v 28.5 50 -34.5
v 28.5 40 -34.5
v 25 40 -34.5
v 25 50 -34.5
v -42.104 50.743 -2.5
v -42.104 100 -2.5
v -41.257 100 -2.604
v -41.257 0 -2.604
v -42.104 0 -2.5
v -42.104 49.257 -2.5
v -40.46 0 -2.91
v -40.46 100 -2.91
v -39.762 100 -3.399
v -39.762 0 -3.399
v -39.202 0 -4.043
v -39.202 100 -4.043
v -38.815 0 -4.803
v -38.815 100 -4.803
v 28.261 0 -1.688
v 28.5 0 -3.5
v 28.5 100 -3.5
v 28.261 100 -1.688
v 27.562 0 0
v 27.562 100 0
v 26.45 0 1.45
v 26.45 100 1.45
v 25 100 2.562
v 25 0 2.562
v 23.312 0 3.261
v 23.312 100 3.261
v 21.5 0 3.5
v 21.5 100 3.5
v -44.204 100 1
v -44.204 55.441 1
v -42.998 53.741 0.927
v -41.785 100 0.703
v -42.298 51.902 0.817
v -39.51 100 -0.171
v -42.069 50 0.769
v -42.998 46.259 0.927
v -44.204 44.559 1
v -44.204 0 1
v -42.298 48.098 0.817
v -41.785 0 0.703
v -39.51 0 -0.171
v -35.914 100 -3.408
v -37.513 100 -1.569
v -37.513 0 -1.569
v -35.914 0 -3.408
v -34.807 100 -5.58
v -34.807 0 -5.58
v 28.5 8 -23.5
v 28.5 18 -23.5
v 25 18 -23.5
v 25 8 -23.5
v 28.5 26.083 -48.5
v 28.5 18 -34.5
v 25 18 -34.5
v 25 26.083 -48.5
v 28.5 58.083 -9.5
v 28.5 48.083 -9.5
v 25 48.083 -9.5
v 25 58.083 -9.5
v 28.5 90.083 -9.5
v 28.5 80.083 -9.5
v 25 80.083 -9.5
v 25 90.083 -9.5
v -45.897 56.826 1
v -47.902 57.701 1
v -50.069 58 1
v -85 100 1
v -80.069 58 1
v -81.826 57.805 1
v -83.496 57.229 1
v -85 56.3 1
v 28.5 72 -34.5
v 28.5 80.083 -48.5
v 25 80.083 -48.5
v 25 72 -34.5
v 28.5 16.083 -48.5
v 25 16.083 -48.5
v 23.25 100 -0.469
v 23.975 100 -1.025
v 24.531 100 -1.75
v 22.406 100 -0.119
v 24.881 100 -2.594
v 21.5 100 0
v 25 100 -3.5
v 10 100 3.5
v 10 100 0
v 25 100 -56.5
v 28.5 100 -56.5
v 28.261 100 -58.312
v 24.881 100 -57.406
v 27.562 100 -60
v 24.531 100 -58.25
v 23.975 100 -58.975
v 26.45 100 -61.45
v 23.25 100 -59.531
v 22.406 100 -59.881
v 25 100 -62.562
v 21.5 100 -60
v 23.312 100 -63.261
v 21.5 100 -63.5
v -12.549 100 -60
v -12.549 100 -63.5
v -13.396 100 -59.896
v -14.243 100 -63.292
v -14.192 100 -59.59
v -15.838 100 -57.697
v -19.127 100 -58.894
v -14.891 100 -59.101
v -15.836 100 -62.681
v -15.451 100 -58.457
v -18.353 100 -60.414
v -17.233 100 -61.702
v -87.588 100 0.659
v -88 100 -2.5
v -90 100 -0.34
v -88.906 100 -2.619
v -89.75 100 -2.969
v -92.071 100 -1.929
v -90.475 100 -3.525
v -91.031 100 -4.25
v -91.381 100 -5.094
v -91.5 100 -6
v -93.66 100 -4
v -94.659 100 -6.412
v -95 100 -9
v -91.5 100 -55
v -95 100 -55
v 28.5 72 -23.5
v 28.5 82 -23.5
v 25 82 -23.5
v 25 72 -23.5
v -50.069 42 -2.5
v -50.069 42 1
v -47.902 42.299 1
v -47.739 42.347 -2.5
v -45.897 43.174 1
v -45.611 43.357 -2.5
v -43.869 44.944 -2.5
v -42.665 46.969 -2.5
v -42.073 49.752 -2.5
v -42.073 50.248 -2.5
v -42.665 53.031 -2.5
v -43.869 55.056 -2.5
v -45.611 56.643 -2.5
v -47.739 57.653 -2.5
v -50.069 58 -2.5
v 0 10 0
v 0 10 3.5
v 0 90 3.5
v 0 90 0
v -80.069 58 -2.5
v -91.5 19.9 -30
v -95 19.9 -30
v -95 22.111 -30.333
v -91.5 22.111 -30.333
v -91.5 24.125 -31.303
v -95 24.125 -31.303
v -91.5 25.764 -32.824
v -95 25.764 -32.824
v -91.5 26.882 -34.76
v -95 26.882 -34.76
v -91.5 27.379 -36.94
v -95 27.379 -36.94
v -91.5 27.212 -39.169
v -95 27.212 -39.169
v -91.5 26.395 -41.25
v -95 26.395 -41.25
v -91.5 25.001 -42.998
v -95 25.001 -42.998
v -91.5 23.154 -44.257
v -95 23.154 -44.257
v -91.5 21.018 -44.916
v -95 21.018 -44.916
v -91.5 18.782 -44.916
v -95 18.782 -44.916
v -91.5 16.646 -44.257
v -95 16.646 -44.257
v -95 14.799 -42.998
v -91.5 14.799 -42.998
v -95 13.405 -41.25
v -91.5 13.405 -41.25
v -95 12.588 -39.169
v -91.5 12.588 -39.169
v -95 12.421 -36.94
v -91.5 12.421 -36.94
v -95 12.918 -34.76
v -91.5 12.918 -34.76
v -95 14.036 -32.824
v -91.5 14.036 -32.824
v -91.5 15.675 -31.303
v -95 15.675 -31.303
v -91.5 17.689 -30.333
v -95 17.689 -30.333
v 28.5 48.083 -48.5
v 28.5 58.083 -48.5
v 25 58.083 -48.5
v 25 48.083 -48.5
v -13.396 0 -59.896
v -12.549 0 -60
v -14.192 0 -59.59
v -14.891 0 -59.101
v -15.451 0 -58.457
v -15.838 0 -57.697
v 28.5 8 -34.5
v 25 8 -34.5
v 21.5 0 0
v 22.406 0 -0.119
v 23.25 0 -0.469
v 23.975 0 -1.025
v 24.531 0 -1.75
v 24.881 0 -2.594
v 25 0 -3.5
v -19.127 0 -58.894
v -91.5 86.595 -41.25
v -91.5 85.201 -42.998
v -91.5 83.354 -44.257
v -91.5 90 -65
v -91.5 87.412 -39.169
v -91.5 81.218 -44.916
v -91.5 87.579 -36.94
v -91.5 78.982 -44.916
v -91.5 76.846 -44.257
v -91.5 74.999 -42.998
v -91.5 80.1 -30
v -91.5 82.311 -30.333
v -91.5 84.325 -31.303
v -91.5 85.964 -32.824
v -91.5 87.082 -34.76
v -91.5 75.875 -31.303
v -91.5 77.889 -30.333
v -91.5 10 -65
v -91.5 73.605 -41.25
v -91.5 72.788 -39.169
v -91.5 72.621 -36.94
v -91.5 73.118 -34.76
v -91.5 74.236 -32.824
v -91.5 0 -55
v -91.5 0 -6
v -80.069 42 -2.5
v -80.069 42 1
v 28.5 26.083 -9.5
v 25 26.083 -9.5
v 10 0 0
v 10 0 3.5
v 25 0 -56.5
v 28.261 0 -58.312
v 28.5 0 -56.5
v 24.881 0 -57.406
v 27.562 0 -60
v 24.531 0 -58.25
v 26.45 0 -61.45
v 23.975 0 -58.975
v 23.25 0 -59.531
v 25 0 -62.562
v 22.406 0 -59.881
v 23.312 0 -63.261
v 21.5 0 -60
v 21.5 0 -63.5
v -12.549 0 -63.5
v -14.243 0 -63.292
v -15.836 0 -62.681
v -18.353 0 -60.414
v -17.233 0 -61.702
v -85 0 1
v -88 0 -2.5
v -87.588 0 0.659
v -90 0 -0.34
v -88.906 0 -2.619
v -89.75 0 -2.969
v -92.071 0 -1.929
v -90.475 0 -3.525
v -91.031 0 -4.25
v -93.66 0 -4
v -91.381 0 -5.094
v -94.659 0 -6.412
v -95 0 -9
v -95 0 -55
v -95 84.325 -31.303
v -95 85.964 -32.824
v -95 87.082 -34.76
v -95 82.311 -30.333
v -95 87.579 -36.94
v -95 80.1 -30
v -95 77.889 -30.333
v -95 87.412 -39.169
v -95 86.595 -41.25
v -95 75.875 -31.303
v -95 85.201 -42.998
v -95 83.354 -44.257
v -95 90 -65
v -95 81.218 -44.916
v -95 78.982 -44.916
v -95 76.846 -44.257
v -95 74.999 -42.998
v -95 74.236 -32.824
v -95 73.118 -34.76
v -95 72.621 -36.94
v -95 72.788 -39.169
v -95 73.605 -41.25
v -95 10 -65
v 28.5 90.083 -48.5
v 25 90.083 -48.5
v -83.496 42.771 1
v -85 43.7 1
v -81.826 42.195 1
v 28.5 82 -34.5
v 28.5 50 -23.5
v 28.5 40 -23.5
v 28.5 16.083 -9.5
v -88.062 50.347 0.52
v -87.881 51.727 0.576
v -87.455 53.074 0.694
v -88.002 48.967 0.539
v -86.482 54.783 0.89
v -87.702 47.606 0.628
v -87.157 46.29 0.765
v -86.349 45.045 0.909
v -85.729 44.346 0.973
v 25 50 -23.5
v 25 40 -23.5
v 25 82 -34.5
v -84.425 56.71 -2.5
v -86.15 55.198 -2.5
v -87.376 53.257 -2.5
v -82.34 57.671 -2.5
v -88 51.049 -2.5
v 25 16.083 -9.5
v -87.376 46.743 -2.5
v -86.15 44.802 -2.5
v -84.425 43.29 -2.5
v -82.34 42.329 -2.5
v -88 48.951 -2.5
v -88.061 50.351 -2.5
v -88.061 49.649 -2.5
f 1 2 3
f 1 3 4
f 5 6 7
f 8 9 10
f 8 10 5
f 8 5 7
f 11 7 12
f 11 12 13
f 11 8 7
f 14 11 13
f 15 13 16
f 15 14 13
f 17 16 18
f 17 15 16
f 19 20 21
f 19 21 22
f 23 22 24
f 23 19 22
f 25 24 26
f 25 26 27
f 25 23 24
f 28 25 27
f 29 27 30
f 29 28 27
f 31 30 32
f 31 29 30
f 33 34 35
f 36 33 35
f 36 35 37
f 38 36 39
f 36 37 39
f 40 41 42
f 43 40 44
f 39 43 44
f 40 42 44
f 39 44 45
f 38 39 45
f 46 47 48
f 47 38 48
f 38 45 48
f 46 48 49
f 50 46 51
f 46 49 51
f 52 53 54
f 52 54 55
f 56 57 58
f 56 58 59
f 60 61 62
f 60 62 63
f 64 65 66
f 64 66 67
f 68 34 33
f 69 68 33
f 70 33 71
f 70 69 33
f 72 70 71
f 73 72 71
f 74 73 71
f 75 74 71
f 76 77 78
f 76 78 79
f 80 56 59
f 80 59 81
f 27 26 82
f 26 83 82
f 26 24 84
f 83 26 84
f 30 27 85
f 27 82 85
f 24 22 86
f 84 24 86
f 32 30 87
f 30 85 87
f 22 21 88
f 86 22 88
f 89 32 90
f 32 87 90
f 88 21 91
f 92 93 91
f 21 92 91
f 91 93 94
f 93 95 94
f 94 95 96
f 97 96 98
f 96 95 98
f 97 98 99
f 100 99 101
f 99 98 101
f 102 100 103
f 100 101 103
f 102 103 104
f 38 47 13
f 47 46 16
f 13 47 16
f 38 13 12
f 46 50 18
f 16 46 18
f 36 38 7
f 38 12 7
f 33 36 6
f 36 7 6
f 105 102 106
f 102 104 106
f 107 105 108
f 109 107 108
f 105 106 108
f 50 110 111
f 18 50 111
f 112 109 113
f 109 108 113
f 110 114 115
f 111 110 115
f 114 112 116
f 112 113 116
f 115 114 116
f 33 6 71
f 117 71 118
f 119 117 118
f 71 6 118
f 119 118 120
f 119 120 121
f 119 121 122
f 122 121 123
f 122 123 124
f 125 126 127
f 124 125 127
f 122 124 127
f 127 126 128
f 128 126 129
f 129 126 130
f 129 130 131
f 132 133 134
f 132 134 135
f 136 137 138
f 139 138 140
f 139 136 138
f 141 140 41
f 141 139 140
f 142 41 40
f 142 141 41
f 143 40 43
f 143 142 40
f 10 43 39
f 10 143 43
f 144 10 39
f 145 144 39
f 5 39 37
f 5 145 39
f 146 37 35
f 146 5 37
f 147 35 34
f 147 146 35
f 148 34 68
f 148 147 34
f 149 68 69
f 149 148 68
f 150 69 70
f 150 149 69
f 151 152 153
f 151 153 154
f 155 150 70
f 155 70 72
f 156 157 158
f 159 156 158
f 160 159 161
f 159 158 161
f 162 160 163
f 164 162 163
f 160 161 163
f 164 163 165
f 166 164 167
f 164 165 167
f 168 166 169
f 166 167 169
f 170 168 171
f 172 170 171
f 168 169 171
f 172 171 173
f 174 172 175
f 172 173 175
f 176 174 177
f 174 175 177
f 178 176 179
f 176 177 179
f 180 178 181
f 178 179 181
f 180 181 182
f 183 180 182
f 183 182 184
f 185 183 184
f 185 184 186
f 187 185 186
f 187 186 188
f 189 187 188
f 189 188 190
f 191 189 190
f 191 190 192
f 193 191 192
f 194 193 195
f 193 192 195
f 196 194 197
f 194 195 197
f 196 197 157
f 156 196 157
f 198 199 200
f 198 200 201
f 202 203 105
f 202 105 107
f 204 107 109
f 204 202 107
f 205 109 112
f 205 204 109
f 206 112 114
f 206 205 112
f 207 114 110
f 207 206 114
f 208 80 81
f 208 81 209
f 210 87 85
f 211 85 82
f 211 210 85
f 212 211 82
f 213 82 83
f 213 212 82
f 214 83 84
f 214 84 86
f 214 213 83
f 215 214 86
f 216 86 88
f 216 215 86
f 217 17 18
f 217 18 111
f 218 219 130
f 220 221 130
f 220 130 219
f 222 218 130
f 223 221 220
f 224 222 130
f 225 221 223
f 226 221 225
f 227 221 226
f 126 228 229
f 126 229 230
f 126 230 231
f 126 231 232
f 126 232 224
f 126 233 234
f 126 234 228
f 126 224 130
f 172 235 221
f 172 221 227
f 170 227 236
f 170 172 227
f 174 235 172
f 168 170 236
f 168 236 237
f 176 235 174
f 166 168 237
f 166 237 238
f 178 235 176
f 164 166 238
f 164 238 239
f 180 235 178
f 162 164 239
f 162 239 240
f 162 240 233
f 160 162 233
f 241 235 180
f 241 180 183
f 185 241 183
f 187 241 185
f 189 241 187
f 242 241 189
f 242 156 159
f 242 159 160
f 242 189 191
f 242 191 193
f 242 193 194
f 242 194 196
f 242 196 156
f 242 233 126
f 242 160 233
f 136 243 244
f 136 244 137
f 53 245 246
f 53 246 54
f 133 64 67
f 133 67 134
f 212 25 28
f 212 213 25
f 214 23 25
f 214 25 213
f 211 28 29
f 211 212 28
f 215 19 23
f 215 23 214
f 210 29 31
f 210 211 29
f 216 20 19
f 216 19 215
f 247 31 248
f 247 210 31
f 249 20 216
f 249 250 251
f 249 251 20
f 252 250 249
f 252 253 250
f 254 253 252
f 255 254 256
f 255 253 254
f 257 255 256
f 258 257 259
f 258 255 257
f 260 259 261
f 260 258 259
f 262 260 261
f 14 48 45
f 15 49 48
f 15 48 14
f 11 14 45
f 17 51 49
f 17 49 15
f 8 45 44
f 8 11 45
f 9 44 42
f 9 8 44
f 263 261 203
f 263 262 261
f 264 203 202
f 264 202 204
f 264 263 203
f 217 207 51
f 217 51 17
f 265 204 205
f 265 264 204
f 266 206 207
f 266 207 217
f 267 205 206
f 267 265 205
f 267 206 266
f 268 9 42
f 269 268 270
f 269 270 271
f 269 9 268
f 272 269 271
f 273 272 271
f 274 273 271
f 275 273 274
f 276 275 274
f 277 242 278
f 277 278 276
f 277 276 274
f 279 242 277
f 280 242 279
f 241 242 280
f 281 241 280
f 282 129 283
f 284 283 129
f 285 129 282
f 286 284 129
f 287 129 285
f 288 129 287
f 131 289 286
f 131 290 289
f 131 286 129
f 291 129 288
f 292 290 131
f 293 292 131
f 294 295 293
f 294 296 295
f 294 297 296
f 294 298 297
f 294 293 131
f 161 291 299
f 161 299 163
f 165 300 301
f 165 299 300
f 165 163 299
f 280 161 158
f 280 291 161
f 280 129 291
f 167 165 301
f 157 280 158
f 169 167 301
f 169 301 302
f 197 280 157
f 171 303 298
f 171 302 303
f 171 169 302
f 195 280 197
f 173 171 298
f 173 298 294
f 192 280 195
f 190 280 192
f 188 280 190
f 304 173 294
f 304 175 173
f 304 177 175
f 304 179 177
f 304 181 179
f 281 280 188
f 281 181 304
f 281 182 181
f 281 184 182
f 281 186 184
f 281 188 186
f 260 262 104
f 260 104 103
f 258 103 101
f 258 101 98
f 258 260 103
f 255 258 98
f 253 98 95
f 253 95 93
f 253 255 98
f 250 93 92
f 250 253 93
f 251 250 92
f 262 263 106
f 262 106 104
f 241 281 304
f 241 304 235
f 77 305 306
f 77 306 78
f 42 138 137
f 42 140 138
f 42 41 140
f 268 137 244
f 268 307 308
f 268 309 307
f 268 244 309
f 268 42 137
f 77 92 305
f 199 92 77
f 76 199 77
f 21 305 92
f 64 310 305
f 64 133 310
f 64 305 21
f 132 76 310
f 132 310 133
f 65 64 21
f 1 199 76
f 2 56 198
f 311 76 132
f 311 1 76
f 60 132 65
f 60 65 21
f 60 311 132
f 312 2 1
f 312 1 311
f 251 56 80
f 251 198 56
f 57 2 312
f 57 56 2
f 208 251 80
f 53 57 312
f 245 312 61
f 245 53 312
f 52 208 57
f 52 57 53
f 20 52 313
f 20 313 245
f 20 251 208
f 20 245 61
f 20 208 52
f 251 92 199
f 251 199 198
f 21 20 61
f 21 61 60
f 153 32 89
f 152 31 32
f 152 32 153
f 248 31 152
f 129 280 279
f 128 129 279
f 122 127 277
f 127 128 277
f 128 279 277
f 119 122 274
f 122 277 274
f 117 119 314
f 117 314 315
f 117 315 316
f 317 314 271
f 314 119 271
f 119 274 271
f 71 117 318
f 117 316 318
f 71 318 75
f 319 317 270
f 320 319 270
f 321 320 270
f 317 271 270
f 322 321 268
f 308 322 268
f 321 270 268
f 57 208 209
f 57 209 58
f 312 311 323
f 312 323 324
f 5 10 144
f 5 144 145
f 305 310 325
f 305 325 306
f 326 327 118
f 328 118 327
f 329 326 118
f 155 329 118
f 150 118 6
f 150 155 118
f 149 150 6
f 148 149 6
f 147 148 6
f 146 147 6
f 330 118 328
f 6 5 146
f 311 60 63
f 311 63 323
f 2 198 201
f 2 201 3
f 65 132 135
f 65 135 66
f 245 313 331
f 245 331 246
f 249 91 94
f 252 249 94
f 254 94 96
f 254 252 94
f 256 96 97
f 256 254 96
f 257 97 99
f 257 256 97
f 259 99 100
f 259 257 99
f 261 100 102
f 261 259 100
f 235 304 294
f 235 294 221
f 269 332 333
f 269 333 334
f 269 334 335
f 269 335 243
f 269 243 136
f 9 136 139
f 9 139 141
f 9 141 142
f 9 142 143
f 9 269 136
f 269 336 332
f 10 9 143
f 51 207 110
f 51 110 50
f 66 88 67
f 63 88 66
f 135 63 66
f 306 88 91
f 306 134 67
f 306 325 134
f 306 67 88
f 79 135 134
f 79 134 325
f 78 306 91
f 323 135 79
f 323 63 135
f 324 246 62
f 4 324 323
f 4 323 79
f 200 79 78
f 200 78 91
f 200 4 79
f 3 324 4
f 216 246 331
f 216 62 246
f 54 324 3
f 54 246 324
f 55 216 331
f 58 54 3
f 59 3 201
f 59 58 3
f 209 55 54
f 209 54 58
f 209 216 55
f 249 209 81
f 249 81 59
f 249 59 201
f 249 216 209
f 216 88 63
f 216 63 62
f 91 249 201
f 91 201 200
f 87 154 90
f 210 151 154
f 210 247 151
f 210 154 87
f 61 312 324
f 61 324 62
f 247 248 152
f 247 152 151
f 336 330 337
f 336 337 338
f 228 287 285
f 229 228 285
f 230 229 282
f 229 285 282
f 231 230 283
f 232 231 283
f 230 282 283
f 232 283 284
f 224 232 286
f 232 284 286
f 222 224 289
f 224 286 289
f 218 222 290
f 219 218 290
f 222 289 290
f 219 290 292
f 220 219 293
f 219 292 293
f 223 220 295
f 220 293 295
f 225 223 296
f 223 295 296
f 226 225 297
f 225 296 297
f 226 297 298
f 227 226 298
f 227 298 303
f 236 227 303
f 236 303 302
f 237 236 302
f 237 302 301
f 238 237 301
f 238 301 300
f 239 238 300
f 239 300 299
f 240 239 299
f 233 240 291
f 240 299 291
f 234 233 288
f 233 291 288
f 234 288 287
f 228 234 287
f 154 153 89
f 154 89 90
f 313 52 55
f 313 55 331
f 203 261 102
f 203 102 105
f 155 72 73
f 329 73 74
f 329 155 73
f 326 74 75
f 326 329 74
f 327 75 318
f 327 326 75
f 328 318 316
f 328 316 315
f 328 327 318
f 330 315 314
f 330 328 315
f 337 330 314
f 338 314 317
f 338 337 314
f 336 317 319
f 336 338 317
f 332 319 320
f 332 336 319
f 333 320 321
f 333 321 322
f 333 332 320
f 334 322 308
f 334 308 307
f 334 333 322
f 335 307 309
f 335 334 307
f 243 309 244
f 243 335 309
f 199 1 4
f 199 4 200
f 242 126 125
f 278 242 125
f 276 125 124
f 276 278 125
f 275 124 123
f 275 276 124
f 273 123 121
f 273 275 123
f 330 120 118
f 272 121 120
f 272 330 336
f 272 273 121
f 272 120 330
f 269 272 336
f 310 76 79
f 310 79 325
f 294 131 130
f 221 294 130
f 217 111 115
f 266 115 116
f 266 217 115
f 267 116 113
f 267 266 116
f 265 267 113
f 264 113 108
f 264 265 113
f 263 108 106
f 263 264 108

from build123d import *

# Parameters (mm, degrees)
BOSS_EXTRUDE2_DEPTH = 100
CHAMFER1_SIZE       = 10
SKETCH2_R           = 7.5
CUT_EXTRUDE1_DEPTH  = 3.5
CUT_EXTRUDE2_DEPTH  = 3.5
CUT_EXTRUDE3_DEPTH  = 10
FILLET1_R           = 10


with BuildPart() as part:
    # Sketch1 → Boss-Extrude2 (new body)
    with BuildSketch(Plane(origin=(0, 0, 0), x_dir=(1, 0, 0), z_dir=(0, 1, 0))):
        with BuildLine():
            Line((0, 0), (21.5, 0))
            ThreePointArc((21.5, 0), (23.974873734, 1.025126266), (25, 3.5))
            Line((25, 3.5), (25, 56.5))
            ThreePointArc((25, 56.5), (23.974873734, 58.974873734), (21.5, 60))
            Line((21.5, 60), (-12.549273616, 60))
            ThreePointArc((-12.549273616, 60), (-14.556791143, 59.367032155), (-15.838197789, 57.697070502))
            Line((-15.838197789, 57.697070502), (-37.20218429, -1))
            Line((-37.20218429, -1), (-95, -1))
            Line((-95, -1), (-95, 65))
            Line((-95, 65), (-91.5, 65))
            Line((-91.5, 65), (-91.5, 6))
            ThreePointArc((-91.5, 6), (-90.474873734, 3.525126266), (-88, 2.5))
            Line((-88, 2.5), (-42.103637058, 2.5))
            ThreePointArc((-42.103637058, 2.5), (-40.09611953, 3.132967845), (-38.814712885, 4.802929498))
            Line((-38.814712885, 4.802929498), (-19.127121962, 58.894141003))
            ThreePointArc((-19.127121962, 58.894141003), (-16.564308671, 62.23406431), (-12.549273616, 63.5))
            Line((-12.549273616, 63.5), (21.5, 63.5))
            ThreePointArc((21.5, 63.5), (26.449747468, 61.449747468), (28.5, 56.5))
            Line((28.5, 56.5), (28.5, 3.5))
            ThreePointArc((28.5, 3.5), (26.449747468, -1.449747468), (21.5, -3.5))
            Line((21.5, -3.5), (0, -3.5))
            Line((0, -3.5), (0, 0))
        make_face()
    extrude(amount=BOSS_EXTRUDE2_DEPTH)

    # Chamfer1
    chamfer1_edges = [part.edges().sort_by_distance(p)[0] for p in [
        (-93.25, 0, -65),
        (0, 0, 1.75),
        (0, 100, 1.75),
        (-93.25, 100, -65),
    ]]
    chamfer(chamfer1_edges, length=CHAMFER1_SIZE)

    # Sketch2 → Cut-Extrude1 (cut)
    with BuildSketch(Plane.ZY.offset(95)):
        with Locations((-37.5, 19.9)):
            Circle(SKETCH2_R)
        with Locations((-37.5, 80.1)):
            Circle(SKETCH2_R)
    extrude(amount=-CUT_EXTRUDE1_DEPTH, mode=Mode.SUBTRACT)

    # Sketch3 → Cut-Extrude2 (cut)
    with BuildSketch(Plane(origin=(0, 0, -2.5), x_dir=(-1, 0, 0), z_dir=(0, 0, -1))):
        with BuildLine():
            Line((50.069082037, 58), (80.069082037, 58))
            ThreePointArc((80.069082037, 58), (88.069082037, 50), (80.069082037, 42))
            Line((80.069082037, 42), (50.069082037, 42))
            ThreePointArc((50.069082037, 42), (42.069082037, 50), (50.069082037, 58))
        make_face()
    extrude(amount=-CUT_EXTRUDE2_DEPTH, mode=Mode.SUBTRACT)

    # Sketch4 → Cut-Extrude3 (cut)
    with BuildSketch(Plane(origin=(28.5, 0, 0), x_dir=(0, 0, -1), z_dir=(1, 0, 0))):
        Polygon((48.5, 26.082903769), (48.5, 16.082903769), (34.5, 8), (34.5, 18), align=None)
        Polygon((23.5, 18), (23.5, 8), (9.5, 16.082903769), (9.5, 26.082903769), align=None)
        Polygon((48.5, 58.082903769), (48.5, 48.082903769), (34.5, 40), (34.5, 50), align=None)
        Polygon((23.5, 50), (23.5, 40), (9.5, 48.082903769), (9.5, 58.082903769), align=None)
        Polygon((48.5, 90.082903769), (48.5, 80.082903769), (34.5, 72), (34.5, 82), align=None)
        Polygon((23.5, 82), (23.5, 72), (9.5, 80.082903769), (9.5, 90.082903769), align=None)
    extrude(amount=-CUT_EXTRUDE3_DEPTH, mode=Mode.SUBTRACT)

    # Fillet1
    # the kernel refuses this fillet: 10 mm, written as the material it takes off along each edge
    with BuildSketch(Plane(origin=(-37.20218429, -17.505188455, 1), x_dir=(0.3420201433256651, 0, -0.9396926207859098), z_dir=(0, 1, 0))) as fillet1_piece_1:
        with BuildLine():
            CenterArc((FILLET1_R * 0.70020753821, FILLET1_R), FILLET1_R, 200, 70)
            Line((-FILLET1_R * 0.239485082576, FILLET1_R * 0.657979856674), (0, 0))
            Line((0, 0), (FILLET1_R * 0.70020753821, 0))
        make_face()
    extrude(amount=135.01037691, mode=Mode.SUBTRACT)
    with BuildSketch(Plane(origin=(-95, -25, 1), x_dir=(1, 0, 0), z_dir=(0, 1, 0))) as fillet1_piece_2:
        with BuildLine():
            CenterArc((FILLET1_R, FILLET1_R), FILLET1_R, 180, 90)
            Line((0, FILLET1_R), (0, 0))
            Line((0, 0), (FILLET1_R, 0))
        make_face()
    extrude(amount=150, mode=Mode.SUBTRACT)


solid = part.part
